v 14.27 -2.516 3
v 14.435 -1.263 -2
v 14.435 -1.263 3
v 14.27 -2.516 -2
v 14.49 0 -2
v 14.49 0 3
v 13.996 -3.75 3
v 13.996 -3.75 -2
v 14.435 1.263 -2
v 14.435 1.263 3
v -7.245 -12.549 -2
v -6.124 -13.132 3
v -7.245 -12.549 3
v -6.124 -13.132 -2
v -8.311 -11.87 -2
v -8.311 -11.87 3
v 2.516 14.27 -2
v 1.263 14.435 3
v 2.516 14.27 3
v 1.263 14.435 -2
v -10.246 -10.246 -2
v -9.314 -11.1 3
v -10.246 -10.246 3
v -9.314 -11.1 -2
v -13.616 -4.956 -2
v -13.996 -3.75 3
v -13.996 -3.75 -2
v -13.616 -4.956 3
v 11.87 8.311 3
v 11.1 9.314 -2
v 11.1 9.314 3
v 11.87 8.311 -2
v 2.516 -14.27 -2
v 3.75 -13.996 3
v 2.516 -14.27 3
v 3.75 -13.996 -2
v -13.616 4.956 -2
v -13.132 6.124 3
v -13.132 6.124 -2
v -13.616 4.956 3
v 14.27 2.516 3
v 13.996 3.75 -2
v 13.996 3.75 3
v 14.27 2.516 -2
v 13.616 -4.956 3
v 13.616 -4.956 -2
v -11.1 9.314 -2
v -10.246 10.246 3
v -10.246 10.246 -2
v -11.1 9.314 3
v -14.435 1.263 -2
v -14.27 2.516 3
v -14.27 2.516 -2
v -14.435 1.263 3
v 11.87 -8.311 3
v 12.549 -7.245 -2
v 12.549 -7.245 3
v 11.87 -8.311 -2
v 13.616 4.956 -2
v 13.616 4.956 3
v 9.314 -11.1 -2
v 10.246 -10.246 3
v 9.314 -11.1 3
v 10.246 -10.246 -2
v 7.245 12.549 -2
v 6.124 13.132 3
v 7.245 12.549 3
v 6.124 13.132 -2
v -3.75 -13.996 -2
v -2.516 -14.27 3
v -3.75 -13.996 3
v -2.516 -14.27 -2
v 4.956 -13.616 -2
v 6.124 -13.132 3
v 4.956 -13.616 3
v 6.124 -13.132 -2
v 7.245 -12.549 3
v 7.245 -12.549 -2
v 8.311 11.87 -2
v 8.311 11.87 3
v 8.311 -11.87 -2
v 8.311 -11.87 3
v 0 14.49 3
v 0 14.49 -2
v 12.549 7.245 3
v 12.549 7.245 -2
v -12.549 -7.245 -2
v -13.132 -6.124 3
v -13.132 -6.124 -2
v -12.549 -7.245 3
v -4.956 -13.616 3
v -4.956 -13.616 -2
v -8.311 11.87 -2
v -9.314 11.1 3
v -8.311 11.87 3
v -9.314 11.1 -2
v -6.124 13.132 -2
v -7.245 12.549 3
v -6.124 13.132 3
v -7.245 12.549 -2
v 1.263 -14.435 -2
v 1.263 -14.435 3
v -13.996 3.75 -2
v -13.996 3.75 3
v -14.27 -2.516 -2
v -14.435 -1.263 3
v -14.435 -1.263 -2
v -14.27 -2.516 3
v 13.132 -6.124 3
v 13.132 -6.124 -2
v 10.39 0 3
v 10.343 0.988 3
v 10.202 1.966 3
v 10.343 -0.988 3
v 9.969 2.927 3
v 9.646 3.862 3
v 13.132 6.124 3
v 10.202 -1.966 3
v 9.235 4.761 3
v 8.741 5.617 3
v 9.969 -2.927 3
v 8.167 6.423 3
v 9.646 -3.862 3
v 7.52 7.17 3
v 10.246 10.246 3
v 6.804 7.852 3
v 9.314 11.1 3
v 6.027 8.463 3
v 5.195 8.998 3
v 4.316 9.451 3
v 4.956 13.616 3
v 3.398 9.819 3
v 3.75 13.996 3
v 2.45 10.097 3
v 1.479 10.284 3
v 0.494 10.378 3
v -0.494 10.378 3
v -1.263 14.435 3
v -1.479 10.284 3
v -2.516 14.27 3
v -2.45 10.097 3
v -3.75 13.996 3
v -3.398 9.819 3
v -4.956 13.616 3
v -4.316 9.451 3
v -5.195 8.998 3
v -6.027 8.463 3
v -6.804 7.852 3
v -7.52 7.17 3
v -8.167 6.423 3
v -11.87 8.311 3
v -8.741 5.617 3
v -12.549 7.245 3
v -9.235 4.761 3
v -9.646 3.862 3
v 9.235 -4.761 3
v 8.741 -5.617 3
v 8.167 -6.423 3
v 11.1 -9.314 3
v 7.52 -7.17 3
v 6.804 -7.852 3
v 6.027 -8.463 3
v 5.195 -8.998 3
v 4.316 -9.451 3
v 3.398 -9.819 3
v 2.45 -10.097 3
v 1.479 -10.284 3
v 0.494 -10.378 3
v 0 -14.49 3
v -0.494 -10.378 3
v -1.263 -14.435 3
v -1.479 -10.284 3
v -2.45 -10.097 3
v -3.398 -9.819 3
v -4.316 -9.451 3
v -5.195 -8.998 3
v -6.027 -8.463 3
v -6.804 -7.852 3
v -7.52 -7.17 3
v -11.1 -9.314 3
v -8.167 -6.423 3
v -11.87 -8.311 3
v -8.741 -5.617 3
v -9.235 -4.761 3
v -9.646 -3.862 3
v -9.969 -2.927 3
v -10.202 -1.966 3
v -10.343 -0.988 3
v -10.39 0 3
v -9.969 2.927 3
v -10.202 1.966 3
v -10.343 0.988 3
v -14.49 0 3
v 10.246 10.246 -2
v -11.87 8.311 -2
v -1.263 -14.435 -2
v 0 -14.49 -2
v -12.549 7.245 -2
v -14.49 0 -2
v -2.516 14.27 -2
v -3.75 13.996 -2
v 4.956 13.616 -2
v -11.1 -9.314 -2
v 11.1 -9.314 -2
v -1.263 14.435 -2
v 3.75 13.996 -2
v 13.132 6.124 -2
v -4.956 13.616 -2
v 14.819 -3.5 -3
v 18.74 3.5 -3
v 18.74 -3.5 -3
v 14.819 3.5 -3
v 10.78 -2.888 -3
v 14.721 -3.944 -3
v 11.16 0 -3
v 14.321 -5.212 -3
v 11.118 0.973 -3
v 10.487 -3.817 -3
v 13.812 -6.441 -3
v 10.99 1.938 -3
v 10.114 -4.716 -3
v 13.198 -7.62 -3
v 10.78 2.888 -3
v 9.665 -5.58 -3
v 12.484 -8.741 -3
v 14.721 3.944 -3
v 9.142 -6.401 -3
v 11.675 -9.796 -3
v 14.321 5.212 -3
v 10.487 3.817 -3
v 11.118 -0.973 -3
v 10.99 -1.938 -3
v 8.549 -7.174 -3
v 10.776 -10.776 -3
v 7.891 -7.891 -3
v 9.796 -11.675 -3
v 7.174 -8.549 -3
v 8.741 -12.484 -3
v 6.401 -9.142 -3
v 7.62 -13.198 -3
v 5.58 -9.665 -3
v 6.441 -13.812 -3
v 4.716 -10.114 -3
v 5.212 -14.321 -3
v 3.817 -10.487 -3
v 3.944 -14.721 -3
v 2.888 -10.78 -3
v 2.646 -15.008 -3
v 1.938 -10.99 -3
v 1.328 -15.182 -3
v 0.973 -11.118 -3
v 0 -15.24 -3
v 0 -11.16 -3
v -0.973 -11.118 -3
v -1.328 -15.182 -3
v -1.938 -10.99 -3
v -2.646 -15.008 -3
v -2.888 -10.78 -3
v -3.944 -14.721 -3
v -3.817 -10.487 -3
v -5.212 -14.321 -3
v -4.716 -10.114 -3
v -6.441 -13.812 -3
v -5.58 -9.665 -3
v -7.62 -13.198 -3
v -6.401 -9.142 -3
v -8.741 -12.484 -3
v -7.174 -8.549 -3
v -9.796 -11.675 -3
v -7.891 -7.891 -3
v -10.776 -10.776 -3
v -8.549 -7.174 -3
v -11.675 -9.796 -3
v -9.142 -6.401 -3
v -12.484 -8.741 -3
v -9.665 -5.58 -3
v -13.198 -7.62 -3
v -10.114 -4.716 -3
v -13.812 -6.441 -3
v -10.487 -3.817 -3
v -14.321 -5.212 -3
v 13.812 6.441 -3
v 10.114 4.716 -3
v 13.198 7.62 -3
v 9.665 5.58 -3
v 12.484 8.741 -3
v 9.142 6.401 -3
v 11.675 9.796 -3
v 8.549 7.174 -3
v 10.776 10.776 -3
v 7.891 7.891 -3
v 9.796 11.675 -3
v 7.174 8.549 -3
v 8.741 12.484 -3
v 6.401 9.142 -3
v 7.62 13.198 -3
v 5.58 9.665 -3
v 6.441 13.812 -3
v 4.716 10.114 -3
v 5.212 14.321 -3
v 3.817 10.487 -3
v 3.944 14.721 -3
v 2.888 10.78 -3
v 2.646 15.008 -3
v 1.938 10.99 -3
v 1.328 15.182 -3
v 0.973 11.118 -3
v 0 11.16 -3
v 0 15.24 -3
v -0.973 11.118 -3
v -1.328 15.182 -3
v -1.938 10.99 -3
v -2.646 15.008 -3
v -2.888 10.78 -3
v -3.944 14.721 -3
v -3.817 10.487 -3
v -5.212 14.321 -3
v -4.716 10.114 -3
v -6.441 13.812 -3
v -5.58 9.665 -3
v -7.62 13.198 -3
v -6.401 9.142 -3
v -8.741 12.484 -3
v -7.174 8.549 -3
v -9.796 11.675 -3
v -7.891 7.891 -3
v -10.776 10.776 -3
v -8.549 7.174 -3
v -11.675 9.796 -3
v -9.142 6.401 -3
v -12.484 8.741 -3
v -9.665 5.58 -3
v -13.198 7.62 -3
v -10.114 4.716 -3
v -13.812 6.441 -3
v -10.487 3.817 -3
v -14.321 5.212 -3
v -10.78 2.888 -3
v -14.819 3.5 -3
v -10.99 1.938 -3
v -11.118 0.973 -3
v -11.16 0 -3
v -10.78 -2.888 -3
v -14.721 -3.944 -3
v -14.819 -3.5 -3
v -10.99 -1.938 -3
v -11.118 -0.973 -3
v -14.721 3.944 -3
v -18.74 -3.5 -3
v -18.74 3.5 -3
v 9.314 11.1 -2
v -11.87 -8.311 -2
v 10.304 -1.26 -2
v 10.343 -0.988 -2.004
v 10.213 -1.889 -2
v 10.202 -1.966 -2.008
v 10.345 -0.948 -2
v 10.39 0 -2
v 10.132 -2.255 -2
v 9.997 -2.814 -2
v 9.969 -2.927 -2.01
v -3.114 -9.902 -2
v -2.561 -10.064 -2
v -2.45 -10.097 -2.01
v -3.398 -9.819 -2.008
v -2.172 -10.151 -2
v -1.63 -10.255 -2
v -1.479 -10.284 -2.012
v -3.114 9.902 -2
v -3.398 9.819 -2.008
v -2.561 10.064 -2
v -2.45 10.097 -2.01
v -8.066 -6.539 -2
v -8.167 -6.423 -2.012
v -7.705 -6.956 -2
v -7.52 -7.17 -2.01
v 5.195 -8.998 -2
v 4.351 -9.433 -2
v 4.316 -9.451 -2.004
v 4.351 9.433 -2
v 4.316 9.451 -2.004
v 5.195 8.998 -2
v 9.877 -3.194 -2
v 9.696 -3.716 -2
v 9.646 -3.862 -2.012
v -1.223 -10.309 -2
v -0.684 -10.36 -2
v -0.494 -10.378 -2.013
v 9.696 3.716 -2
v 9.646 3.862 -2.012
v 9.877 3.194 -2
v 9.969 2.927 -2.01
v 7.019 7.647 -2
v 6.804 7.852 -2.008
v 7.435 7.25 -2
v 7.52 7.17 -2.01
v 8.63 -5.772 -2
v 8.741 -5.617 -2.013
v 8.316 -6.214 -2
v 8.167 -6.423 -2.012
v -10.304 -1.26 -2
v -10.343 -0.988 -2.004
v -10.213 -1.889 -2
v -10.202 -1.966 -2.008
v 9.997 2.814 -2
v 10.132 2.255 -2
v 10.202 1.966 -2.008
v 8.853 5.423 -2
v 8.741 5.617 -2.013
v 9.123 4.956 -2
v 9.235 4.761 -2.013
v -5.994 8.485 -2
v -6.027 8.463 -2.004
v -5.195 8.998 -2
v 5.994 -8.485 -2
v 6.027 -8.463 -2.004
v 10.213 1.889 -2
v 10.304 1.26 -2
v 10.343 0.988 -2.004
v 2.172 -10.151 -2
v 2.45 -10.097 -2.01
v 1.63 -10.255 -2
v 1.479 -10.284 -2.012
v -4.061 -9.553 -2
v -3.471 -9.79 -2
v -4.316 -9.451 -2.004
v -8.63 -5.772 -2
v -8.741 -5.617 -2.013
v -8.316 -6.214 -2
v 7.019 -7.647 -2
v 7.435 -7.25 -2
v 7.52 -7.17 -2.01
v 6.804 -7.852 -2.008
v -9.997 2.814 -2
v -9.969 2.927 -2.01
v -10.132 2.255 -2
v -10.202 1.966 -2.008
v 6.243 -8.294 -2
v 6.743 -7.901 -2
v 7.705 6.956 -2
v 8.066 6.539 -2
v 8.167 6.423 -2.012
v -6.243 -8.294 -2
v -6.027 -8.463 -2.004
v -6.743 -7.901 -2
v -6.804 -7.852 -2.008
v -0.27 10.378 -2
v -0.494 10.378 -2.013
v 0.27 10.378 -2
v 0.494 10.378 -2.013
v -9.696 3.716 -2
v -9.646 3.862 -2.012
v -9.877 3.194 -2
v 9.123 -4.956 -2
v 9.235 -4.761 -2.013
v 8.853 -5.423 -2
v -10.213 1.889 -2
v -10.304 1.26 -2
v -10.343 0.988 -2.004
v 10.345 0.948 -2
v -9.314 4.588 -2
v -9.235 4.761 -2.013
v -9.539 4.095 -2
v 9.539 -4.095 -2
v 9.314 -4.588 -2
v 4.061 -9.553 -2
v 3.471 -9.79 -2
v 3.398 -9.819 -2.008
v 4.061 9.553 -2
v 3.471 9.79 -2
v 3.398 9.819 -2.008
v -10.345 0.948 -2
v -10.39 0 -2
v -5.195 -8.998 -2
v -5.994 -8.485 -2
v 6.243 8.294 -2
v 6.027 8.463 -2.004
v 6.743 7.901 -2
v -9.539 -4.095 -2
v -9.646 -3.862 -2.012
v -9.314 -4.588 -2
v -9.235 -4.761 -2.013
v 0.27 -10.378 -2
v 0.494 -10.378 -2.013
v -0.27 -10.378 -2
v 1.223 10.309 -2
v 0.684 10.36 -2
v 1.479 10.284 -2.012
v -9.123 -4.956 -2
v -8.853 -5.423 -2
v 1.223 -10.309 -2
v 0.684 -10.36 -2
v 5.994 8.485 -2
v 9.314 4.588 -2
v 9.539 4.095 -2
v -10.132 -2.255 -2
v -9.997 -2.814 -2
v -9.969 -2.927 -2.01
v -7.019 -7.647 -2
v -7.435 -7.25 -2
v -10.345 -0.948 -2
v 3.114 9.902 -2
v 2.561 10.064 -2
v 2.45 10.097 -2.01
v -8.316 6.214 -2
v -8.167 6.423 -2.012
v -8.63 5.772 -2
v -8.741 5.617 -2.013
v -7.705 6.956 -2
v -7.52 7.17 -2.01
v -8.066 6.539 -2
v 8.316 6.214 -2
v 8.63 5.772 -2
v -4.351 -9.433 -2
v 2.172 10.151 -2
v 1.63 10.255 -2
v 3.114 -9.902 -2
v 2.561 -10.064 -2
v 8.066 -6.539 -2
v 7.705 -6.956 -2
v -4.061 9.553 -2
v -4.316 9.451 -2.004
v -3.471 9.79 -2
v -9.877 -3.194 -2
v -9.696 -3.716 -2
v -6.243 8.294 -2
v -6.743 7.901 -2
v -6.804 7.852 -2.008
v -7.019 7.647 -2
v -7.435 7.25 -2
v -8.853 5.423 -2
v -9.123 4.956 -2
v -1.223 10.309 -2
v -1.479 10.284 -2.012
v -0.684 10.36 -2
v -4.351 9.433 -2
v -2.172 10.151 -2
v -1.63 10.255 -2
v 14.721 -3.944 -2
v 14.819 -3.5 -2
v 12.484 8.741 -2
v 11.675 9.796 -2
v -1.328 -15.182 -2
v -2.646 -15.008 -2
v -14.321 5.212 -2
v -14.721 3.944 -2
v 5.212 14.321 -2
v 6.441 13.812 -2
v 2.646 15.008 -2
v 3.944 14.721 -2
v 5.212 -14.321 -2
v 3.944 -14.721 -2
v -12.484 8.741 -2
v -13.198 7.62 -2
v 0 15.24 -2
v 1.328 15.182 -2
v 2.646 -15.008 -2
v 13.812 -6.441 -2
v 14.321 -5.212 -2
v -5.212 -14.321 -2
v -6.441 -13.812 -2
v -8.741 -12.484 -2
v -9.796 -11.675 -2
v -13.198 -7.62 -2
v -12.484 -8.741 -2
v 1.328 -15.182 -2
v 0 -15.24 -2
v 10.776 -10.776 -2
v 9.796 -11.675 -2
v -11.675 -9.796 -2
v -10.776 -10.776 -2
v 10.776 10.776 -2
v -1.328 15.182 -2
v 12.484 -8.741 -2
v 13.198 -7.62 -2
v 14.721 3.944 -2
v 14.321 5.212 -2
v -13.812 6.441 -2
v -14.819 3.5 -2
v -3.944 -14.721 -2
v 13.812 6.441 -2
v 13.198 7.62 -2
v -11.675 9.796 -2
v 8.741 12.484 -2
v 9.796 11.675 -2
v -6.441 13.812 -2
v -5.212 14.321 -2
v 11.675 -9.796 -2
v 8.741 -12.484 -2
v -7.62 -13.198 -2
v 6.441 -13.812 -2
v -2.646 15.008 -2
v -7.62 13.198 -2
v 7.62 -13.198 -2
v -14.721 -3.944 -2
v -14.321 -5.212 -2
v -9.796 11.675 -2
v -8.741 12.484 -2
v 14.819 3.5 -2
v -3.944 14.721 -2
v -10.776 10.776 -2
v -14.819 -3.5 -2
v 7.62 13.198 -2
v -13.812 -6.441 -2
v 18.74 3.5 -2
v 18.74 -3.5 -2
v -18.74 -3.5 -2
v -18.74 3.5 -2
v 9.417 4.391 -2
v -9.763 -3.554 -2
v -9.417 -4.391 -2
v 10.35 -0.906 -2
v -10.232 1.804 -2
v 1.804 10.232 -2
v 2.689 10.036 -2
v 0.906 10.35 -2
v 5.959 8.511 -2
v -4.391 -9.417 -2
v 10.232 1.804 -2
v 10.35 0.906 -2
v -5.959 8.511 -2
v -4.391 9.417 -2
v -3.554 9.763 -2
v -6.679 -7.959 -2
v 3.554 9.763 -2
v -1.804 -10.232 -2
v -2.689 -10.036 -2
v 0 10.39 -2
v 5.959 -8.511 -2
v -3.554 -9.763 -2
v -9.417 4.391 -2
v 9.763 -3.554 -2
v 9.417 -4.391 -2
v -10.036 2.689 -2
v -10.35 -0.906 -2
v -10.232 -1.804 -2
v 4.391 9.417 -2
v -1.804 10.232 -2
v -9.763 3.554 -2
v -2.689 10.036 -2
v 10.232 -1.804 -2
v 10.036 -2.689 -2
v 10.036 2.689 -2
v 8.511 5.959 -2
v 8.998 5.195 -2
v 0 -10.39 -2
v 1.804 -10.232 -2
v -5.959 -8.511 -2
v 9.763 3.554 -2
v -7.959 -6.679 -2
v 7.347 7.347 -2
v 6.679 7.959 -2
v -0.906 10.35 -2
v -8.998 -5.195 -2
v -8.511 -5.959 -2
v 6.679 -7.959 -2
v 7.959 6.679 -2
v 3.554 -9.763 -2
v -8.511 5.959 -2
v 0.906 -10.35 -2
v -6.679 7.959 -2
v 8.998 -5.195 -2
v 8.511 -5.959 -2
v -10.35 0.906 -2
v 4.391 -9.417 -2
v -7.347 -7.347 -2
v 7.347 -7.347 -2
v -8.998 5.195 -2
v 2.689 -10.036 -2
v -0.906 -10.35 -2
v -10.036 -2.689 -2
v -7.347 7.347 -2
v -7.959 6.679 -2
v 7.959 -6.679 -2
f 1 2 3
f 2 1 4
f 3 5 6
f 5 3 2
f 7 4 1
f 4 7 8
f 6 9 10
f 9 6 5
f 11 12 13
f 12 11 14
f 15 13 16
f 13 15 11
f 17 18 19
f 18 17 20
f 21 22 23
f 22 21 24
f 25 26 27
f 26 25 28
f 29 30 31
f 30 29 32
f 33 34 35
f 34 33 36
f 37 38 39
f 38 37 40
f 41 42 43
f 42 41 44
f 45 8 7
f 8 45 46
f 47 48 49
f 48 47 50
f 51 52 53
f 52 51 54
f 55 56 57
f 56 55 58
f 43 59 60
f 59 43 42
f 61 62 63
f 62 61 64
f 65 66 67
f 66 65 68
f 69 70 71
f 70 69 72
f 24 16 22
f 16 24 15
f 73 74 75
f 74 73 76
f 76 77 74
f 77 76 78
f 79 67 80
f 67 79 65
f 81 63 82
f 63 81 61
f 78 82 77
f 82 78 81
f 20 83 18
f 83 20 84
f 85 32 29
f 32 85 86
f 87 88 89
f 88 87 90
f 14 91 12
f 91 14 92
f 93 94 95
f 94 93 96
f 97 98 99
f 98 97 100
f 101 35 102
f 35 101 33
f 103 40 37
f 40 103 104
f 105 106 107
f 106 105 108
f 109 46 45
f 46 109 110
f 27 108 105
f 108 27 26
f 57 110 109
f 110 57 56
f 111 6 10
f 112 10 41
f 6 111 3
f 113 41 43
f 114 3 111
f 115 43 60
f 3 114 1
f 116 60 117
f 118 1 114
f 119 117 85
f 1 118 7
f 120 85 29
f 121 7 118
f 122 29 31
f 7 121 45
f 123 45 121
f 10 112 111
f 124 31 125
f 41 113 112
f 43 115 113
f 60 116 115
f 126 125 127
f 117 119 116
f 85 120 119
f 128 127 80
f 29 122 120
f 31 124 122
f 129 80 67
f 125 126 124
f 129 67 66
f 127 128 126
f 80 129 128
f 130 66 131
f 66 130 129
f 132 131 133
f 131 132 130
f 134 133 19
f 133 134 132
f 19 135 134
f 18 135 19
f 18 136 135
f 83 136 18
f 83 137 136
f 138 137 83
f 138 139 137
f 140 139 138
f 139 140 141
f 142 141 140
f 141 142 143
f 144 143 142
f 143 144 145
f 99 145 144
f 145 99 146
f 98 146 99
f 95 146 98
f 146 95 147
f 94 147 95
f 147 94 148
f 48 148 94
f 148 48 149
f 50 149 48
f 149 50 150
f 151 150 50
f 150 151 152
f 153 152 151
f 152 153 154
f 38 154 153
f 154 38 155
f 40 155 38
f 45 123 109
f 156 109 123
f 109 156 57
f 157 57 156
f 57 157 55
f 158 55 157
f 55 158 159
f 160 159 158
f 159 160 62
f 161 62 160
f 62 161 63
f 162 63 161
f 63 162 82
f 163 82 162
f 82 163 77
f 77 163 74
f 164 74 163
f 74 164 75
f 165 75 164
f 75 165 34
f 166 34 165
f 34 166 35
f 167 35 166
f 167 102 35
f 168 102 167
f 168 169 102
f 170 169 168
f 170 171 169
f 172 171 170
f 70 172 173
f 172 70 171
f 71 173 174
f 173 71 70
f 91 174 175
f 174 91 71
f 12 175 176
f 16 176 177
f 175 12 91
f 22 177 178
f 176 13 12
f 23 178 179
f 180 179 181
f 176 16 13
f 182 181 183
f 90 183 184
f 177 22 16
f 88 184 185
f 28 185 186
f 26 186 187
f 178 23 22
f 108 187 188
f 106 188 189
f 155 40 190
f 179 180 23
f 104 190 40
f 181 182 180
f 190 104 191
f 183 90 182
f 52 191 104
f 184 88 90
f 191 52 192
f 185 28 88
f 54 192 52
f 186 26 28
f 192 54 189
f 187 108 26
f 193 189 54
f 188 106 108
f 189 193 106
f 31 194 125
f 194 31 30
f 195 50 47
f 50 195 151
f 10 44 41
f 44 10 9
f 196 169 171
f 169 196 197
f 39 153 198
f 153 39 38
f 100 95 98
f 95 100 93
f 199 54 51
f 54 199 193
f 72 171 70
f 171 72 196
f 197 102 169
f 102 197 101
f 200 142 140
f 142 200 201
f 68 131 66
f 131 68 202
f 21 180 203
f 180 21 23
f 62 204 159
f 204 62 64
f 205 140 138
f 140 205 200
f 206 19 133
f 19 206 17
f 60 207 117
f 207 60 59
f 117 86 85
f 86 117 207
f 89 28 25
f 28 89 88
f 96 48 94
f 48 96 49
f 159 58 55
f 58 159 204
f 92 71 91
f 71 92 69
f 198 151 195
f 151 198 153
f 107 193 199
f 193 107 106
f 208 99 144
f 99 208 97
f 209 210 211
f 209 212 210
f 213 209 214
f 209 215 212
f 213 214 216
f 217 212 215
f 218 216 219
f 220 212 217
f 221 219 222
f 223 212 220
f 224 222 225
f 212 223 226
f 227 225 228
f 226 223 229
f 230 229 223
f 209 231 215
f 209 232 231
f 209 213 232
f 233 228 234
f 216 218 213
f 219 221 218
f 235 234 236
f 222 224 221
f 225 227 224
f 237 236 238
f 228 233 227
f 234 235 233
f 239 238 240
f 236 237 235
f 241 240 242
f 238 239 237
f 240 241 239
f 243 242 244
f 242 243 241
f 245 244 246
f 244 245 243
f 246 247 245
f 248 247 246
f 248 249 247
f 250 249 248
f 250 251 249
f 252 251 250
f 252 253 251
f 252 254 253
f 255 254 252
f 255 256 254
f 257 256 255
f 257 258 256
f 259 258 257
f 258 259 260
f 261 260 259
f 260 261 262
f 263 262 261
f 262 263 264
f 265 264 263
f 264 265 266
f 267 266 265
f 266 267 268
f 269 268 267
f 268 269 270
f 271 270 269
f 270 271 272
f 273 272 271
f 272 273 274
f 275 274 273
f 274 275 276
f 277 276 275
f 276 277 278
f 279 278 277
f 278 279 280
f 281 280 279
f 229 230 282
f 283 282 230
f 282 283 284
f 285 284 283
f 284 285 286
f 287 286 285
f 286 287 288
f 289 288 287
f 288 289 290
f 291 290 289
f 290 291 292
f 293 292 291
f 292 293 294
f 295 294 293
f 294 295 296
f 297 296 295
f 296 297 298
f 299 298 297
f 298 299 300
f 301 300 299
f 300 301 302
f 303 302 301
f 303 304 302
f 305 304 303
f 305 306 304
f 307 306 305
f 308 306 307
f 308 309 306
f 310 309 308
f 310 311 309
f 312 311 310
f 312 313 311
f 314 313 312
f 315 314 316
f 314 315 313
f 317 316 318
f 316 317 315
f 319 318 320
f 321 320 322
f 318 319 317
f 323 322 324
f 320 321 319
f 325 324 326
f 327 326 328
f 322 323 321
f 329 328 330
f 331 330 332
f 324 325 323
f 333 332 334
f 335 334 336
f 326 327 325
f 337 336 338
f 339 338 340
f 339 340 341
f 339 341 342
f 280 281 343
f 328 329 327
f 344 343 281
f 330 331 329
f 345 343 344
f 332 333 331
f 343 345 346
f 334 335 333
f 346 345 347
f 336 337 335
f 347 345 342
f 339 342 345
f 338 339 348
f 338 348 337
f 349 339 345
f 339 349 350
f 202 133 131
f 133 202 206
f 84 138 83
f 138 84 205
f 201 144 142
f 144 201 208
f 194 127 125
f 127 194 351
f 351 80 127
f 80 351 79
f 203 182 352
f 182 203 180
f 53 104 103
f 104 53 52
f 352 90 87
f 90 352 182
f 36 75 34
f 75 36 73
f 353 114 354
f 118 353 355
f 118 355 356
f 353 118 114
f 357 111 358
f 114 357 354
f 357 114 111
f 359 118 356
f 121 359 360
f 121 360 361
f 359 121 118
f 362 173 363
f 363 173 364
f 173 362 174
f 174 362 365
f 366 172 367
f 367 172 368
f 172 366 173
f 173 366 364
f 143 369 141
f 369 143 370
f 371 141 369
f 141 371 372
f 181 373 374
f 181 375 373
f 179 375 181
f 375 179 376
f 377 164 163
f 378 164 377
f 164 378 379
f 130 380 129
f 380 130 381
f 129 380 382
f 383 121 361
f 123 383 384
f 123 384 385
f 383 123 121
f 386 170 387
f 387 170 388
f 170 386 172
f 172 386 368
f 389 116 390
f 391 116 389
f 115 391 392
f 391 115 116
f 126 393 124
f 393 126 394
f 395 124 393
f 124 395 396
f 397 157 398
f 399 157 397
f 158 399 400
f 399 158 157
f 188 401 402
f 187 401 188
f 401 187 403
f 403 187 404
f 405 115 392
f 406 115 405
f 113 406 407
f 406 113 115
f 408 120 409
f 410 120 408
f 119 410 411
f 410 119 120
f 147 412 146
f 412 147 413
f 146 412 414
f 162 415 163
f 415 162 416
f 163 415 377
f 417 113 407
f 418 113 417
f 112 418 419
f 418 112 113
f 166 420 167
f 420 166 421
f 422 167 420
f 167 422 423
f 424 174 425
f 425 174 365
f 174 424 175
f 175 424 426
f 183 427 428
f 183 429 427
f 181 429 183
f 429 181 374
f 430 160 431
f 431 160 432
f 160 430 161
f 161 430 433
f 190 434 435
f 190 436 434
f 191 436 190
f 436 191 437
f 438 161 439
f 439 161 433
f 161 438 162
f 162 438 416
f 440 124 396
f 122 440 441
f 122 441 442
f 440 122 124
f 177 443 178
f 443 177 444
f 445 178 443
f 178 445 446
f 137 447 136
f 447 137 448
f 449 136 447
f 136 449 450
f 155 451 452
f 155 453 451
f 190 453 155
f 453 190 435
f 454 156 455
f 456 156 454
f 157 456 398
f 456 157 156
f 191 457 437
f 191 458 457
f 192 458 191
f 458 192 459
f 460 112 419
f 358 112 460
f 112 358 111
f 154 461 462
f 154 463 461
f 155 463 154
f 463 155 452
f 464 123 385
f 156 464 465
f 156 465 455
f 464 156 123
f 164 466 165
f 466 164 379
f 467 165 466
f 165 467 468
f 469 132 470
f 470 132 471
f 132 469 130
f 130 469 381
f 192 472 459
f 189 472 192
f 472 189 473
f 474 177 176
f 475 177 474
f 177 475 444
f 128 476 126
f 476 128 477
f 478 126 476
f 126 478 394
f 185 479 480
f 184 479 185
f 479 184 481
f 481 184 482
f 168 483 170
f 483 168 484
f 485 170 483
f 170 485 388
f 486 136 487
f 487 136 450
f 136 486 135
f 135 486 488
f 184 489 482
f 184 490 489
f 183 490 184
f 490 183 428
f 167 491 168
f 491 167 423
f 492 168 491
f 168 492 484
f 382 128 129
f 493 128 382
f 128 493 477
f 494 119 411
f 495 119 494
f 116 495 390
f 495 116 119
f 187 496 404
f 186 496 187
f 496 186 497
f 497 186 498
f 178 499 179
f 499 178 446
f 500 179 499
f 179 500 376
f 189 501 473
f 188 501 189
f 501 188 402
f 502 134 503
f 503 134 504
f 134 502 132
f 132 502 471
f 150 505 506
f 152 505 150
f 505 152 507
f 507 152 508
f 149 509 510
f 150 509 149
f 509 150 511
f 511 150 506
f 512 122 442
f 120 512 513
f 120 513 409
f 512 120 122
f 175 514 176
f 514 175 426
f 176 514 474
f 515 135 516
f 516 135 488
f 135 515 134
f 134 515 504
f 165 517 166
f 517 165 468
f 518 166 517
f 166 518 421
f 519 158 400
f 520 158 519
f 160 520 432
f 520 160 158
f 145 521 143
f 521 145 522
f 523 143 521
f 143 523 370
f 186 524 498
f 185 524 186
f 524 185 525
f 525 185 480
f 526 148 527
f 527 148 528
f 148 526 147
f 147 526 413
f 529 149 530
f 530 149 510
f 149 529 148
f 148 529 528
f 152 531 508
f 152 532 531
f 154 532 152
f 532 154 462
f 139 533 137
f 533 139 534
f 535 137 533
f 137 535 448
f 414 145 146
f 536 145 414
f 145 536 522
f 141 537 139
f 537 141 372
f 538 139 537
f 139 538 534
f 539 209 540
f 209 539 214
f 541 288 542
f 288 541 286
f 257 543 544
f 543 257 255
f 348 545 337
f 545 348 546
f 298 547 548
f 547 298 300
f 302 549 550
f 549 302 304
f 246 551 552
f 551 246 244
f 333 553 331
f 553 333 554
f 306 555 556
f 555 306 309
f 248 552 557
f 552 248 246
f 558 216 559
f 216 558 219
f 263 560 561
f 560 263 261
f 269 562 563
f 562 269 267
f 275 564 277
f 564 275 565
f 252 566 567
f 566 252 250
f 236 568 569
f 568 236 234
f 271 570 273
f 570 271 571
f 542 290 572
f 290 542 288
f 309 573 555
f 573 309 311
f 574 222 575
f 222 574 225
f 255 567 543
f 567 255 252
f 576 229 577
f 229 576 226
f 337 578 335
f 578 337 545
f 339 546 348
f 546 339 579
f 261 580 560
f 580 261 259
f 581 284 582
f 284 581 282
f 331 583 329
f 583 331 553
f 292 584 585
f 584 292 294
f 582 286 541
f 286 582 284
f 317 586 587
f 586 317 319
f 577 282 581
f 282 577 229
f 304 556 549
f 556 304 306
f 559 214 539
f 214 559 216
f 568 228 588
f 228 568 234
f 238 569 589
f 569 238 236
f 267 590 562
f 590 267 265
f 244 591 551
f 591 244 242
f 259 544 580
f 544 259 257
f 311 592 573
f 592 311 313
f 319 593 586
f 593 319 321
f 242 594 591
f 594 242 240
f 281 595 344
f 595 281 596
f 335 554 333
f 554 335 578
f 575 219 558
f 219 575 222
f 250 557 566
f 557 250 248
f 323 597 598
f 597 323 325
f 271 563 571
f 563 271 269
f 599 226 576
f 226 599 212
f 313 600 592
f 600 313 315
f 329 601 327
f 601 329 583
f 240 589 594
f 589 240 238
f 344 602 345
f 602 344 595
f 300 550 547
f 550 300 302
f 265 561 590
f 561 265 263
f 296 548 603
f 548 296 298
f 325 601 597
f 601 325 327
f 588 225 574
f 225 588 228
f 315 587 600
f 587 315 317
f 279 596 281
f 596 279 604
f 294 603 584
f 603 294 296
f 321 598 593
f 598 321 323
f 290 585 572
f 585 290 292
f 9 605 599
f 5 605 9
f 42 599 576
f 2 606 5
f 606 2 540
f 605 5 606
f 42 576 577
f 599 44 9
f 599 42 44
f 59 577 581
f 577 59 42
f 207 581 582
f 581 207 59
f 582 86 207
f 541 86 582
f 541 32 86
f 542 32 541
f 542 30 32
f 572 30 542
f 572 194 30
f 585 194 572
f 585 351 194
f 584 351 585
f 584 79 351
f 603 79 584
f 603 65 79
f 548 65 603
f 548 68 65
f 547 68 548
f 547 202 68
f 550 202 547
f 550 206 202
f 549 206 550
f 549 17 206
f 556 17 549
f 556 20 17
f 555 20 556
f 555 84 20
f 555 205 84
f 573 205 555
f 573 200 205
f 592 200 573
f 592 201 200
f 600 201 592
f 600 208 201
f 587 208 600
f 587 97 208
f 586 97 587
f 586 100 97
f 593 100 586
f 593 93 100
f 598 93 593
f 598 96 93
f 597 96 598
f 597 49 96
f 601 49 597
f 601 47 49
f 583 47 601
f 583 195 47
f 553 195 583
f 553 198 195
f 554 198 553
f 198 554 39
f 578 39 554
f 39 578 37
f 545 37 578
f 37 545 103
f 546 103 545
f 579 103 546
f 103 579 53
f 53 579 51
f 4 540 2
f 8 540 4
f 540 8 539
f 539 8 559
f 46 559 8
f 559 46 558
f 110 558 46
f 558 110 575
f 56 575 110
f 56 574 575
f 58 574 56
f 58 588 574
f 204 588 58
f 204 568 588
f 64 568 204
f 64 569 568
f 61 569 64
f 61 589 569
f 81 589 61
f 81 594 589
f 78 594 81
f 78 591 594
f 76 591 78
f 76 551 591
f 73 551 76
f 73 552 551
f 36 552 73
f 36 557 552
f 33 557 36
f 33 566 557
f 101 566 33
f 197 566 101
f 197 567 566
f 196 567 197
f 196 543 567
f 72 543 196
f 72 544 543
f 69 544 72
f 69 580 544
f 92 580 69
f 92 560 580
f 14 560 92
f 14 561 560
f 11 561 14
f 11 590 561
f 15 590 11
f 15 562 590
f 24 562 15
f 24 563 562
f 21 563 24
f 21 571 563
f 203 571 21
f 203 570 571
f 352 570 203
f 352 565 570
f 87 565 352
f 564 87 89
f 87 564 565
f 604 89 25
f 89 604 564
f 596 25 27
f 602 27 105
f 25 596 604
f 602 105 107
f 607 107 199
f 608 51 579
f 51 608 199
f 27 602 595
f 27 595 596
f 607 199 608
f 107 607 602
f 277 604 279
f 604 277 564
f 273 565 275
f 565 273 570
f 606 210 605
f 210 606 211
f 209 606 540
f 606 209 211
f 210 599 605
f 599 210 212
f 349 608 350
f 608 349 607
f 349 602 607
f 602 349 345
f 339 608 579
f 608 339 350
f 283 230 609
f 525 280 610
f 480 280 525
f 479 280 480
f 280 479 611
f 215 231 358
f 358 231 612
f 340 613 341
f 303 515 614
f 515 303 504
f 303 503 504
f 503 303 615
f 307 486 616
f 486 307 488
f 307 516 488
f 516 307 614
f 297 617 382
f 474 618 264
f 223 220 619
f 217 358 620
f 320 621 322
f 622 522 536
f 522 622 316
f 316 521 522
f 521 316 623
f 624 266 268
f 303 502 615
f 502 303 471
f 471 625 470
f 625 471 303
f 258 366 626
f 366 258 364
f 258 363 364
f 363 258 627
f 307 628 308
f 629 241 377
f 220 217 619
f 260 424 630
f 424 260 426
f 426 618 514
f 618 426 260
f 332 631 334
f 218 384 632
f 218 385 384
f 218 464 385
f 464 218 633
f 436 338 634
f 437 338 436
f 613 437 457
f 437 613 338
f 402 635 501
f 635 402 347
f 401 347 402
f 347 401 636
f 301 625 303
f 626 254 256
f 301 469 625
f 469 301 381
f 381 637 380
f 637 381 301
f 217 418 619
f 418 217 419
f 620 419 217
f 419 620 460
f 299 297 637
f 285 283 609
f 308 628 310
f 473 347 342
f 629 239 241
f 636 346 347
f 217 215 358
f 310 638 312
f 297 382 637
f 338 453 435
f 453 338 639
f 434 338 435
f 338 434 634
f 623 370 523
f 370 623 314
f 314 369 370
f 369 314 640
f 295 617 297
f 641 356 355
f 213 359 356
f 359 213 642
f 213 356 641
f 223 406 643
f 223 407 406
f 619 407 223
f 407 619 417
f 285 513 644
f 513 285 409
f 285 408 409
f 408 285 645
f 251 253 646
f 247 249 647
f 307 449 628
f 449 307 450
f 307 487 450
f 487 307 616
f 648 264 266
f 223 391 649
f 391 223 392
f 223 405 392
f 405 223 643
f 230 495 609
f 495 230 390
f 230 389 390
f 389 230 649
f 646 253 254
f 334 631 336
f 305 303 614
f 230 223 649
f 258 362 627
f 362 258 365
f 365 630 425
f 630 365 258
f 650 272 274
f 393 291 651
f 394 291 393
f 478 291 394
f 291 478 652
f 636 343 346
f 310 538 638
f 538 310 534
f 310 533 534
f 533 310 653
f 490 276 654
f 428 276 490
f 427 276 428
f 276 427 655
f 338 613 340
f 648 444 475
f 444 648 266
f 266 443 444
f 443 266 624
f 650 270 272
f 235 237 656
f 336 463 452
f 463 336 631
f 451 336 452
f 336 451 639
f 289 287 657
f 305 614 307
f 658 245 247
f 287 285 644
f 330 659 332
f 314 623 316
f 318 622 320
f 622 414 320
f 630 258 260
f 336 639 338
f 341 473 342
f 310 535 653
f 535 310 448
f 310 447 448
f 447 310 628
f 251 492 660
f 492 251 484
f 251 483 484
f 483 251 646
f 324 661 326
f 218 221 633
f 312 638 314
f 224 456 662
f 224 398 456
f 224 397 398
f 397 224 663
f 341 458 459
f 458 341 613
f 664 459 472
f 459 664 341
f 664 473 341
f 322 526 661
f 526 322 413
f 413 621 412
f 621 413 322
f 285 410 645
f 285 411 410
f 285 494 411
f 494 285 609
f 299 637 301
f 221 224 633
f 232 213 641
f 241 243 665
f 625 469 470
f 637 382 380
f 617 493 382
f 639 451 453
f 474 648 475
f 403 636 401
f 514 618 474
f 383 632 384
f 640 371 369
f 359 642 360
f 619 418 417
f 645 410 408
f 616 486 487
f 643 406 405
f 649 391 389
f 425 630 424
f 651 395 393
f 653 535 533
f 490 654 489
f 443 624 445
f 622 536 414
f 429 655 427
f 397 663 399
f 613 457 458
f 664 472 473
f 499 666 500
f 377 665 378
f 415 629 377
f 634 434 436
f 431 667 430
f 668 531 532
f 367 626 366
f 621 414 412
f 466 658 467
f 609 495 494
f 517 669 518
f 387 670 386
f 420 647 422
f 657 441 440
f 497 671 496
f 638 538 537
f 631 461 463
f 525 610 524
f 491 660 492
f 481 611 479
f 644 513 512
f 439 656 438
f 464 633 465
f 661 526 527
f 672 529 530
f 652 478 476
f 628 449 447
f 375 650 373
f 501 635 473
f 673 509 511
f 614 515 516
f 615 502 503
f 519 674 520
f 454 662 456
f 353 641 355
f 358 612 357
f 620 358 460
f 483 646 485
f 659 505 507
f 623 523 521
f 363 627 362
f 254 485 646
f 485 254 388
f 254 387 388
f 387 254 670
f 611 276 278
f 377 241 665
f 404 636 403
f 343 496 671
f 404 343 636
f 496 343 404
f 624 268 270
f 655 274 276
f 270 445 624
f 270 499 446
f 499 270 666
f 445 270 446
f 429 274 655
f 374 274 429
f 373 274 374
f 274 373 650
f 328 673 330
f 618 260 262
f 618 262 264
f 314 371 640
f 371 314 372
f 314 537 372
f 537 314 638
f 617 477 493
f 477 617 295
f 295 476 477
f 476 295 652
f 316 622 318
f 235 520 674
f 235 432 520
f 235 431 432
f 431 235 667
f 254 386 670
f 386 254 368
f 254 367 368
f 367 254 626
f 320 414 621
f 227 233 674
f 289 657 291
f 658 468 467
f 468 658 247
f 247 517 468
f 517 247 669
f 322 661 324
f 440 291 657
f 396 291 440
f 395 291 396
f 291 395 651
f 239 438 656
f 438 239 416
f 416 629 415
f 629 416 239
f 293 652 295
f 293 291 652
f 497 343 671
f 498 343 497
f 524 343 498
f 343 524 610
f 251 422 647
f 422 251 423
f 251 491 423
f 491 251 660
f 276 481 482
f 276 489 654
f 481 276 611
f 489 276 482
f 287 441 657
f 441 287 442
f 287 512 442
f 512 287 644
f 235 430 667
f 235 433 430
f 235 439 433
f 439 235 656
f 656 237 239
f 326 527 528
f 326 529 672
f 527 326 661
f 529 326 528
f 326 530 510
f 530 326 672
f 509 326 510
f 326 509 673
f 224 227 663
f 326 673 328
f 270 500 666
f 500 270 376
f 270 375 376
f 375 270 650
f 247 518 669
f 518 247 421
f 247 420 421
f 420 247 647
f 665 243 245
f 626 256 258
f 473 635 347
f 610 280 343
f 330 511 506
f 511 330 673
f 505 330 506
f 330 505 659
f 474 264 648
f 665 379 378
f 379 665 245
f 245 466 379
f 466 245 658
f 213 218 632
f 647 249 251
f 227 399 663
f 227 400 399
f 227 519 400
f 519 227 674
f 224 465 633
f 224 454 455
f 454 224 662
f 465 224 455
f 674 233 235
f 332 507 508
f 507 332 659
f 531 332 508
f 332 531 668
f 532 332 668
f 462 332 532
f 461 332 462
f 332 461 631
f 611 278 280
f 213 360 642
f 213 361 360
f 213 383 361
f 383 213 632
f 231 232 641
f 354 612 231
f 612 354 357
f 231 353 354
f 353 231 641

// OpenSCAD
// file: BOSL2-master/threading.scad
// Minimal thread approximations for bundled gallery models.
// These preserve dimensions for preview/export without generating helical thread detail.

CENTER = [0, 0, 0];

module screw_thread(d=10, l=10, pitch=1, internal=false, anchor=CENTER) {
    center = anchor == CENTER;
    translate(center ? [0, 0, 0] : [0, 0, l / 2])
        cylinder(d=d, h=l, center=true);
}

module threaded_rod(d=10, l=10, pitch=1, internal=false, anchor=CENTER) {
    screw_thread(d=d, l=l, pitch=pitch, internal=internal, anchor=anchor);
}
// file: BOSL2-master/std.scad
// Minimal BOSL2 compatibility shim for bundled gallery models.
// It implements only the helpers used by the imported OpenSCAD projects.

CENTER = [0, 0, 0];
BOTTOM = [0, 0, -1];
TOP = [0, 0, 1];
LEFT = [-1, 0, 0];
RIGHT = [1, 0, 0];
FRONT = [0, -1, 0];
BACK = [0, 1, 0];

module up(z=0) {
    translate([0, 0, z]) children();
}

module down(z=0) {
    translate([0, 0, -z]) children();
}

module attach(anchor=CENTER) {
    children();
}

module cuboid(size=[1, 1, 1], anchor=CENTER) {
    center = anchor == CENTER;
    translate(center ? [0, 0, 0] : [0, 0, size[2] / 2])
        cube(size, center=true);
    children();
}

module xcyl(h=1, r=1, anchor=CENTER) {
    center = anchor == CENTER;
    translate(center ? [0, 0, 0] : [h / 2, 0, 0])
        rotate([0, 90, 0])
            cylinder(h=h, r=r, center=true);
}
// main file
// Adaptor to attach objective to the camera housing. 
// internal threads are RMS to match the objective. External threads match the threads on the camera housing.
include <BOSL2-master/std.scad>
include <BOSL2-master/threading.scad>
$fa=5;
$fs=0.1;
width=46;// Old:40/ New: 40
length=46;// 
depth=14.5;//13.5 was the original.14.5 is the default...
hole_depth=6;
cwidth=38.3;//camera board width: Old: 32.2 / New: 38.5
objdia=19.75;//nominal diameter of objective threads (20.25 first; then decrease...)
//for makerbot this is too small
rotate([180,0,0]){
difference(){
union(){
difference(){
    translate([0, 0, 0]) threaded_rod(d=1.2*25.4-1.5,l=hole_depth,pitch=2);
    translate([0,0,0]) threaded_rod(d=0.8*25.4+0.46,l=hole_depth,pitch=0.7055,
        bevel=false,$slop=0.05,$fa=1,$fs=1);}
difference(){    
translate([0,0,hole_depth/2-1])cylinder(h=1,d=1.2*25.4);//This part is a stop to prevent the ring from going too far.
translate([0,0,hole_depth/2-1])cylinder(h=1,d=1.2*25.4-5);}
translate([(1.2*25.4-5)/2+2,-3.5,hole_depth/2-1])cube([4,7,1]);//Tabs to make it easier to remove
translate([-(1.2*25.4-5)/2-6,-3.5,hole_depth/2-1])cube([4,7,1]);

}
translate([0,0,hole_depth/2-1])cylinder(h=1,d1=0.8*25.4+0.46,d2=0.8*25.4+2);//Bevel to match the part of the objective lacking threads.
}}
